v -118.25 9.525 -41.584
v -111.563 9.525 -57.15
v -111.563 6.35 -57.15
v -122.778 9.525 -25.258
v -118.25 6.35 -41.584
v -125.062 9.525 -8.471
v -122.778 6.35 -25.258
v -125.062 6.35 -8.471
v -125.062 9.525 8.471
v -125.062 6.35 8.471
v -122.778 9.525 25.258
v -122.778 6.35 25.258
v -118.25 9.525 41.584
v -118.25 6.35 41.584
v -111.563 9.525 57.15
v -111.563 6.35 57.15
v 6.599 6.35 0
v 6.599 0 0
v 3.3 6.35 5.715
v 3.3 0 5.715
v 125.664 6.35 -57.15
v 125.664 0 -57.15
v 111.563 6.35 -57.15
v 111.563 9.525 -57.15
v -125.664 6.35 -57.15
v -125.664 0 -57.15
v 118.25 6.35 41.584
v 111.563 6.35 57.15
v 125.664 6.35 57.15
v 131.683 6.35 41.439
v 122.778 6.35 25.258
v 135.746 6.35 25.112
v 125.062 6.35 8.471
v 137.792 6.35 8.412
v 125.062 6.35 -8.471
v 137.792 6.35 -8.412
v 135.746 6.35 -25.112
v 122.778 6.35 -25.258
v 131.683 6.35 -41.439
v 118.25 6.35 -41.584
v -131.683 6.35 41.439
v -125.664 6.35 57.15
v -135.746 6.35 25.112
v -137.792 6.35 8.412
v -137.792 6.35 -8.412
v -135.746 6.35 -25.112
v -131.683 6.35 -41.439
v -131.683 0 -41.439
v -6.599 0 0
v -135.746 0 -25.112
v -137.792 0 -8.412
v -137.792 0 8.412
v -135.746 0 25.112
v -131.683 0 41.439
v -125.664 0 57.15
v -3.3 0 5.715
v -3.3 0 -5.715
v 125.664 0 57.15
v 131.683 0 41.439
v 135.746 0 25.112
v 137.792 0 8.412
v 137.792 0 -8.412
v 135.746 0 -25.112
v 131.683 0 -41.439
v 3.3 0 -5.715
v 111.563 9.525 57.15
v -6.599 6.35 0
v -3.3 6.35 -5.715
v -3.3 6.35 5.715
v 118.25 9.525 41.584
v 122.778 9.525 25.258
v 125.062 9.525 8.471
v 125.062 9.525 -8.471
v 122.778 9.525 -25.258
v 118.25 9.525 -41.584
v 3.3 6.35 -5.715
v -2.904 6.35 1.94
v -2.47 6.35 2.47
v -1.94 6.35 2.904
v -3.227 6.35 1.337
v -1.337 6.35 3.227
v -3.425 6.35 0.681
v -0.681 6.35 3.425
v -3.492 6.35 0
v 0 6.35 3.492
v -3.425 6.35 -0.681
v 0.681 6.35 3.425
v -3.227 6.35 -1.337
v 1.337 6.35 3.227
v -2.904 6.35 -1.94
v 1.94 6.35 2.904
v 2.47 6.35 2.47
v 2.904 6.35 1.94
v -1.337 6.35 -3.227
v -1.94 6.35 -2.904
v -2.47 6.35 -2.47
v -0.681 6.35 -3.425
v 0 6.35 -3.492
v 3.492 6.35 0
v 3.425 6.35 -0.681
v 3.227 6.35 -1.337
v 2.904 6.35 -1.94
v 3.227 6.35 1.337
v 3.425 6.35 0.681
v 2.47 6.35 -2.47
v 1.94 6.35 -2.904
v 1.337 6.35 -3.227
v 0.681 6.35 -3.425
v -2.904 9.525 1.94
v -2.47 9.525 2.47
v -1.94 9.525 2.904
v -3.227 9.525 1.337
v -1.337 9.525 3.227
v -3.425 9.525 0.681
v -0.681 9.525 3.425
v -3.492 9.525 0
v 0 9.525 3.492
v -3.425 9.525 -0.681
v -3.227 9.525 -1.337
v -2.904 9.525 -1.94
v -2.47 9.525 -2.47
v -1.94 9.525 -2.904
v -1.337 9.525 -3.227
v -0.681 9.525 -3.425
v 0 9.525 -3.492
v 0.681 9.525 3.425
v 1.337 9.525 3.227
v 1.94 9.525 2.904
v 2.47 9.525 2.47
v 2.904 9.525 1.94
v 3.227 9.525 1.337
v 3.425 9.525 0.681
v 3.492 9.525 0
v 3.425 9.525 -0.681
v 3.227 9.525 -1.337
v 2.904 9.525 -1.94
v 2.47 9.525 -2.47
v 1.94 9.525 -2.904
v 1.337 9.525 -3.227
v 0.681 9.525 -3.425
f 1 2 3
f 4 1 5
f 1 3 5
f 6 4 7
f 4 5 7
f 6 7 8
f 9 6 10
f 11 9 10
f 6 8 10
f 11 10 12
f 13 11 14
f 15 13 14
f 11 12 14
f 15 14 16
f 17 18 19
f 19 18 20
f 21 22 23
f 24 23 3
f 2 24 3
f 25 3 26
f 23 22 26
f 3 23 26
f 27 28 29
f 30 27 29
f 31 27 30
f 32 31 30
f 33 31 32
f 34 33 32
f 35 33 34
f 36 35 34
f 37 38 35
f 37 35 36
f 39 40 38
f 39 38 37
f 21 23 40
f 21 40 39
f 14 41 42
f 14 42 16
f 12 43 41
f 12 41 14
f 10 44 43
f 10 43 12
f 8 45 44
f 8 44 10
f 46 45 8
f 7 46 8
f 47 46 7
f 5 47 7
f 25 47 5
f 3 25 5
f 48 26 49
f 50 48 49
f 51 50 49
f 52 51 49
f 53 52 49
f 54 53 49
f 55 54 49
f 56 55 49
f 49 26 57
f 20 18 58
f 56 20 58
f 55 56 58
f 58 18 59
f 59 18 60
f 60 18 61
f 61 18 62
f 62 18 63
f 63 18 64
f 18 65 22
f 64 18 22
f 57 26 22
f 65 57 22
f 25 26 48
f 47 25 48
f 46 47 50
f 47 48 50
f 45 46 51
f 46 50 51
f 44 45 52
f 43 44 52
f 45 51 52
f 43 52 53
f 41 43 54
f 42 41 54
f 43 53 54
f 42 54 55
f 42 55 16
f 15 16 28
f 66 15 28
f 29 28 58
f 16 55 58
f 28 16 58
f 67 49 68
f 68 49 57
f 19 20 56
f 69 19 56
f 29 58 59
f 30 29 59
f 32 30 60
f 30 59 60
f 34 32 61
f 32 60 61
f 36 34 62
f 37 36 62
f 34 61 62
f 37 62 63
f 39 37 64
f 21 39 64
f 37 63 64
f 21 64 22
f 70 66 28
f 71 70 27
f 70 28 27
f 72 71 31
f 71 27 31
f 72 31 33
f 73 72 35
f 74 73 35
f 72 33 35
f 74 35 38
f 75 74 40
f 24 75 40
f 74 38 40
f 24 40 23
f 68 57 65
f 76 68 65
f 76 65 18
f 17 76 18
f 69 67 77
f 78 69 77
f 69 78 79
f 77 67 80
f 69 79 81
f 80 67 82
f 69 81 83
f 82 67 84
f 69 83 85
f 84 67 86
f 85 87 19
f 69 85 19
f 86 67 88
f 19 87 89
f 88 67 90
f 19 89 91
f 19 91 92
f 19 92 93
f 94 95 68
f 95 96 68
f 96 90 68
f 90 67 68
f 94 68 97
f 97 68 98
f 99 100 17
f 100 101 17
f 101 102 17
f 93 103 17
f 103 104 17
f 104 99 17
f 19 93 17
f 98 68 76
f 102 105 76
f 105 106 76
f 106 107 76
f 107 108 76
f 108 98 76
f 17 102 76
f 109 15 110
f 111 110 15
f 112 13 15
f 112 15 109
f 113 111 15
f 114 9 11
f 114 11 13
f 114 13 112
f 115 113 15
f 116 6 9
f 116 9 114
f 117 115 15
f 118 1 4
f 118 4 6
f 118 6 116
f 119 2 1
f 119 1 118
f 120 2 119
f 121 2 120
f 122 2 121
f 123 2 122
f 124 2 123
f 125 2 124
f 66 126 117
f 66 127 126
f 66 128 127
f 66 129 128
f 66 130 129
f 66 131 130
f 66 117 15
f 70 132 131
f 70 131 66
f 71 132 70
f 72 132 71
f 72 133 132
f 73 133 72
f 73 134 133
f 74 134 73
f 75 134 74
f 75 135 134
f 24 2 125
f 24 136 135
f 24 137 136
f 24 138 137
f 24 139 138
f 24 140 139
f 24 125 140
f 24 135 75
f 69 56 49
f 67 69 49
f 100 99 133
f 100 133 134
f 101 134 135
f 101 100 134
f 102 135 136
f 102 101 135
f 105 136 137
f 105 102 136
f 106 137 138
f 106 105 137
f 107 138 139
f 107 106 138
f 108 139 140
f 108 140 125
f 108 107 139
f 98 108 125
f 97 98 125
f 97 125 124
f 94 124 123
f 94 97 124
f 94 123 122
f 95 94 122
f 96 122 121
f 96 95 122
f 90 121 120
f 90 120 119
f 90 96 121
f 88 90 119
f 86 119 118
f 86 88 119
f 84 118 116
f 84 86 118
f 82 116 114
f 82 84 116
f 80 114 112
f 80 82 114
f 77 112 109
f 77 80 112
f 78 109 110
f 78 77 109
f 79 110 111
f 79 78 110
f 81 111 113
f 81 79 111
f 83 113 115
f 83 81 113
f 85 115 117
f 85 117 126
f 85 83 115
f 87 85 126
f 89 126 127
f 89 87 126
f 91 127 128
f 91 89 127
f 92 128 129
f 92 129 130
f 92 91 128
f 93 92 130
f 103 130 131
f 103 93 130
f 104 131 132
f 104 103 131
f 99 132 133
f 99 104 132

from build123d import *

# Parameters (mm, degrees)
BOSS_EXTRUDE1_DEPTH = 9.525
BOSS_EXTRUDE2_DEPTH = 6.35
BOSS_EXTRUDE3_START = 6.35
SKETCH1_4_R         = 3.4925
BOSS_EXTRUDE3_DEPTH = 3.175


with BuildPart() as part:
    # Sketch1 → Boss-Extrude1 (new body)
    with BuildSketch(Plane(origin=(0, 0, 0), x_dir=(1, 0, 0), z_dir=(0, 1, 0))):
        with BuildLine():
            Line((111.562759472, 57.15), (-111.562759472, 57.15))
            ThreePointArc((-111.562759472, 57.15), (-125.349, 0), (-111.562759472, -57.15))
            Line((-111.562759472, -57.15), (111.562759472, -57.15))
            ThreePointArc((111.562759472, -57.15), (125.349, 0), (111.562759472, 57.15))
        make_face()
        Polygon((-3.299556788, -5.715), (-6.599113577, 0), (-3.299556788, 5.715), (3.299556788, 5.715), (6.599113577, 0), (3.299556788, -5.715), align=None, mode=Mode.SUBTRACT)
    extrude(amount=BOSS_EXTRUDE1_DEPTH)

    # Sketch1<3> → Boss-Extrude2 (add)
    with BuildSketch(Plane(origin=(0, 0, 0), x_dir=(1, 0, 0), z_dir=(0, 1, 0))):
        with BuildLine():
            Line((-111.562759472, 57.15), (-125.663852802, 57.15))
            ThreePointArc((-125.663852802, 57.15), (-138.049, 0), (-125.663852802, -57.15))
            Line((-125.663852802, -57.15), (-111.562759472, -57.15))
            ThreePointArc((-111.562759472, -57.15), (-125.349, 0), (-111.562759472, 57.15))
        make_face()
        with BuildLine():
            Line((125.663852802, 57.15), (111.562759472, 57.15))
            ThreePointArc((111.562759472, 57.15), (125.349, 0), (111.562759472, -57.15))
            Line((111.562759472, -57.15), (125.663852802, -57.15))
            ThreePointArc((125.663852802, -57.15), (138.049, 0), (125.663852802, 57.15))
        make_face()
    extrude(amount=BOSS_EXTRUDE2_DEPTH)

    # Sketch1<4> → Boss-Extrude3 (add)
    with BuildSketch(Plane(origin=(0, 0, 0), x_dir=(1, 0, 0), z_dir=(0, 1, 0)).offset(BOSS_EXTRUDE3_START)):
        Polygon((-3.299556788, 5.715), (-6.599113577, 0), (-3.299556788, -5.715), (3.299556788, -5.715), (6.599113577, 0), (3.299556788, 5.715), align=None)
        Circle(SKETCH1_4_R, mode=Mode.SUBTRACT)
    extrude(amount=BOSS_EXTRUDE3_DEPTH)


solid = part.part
